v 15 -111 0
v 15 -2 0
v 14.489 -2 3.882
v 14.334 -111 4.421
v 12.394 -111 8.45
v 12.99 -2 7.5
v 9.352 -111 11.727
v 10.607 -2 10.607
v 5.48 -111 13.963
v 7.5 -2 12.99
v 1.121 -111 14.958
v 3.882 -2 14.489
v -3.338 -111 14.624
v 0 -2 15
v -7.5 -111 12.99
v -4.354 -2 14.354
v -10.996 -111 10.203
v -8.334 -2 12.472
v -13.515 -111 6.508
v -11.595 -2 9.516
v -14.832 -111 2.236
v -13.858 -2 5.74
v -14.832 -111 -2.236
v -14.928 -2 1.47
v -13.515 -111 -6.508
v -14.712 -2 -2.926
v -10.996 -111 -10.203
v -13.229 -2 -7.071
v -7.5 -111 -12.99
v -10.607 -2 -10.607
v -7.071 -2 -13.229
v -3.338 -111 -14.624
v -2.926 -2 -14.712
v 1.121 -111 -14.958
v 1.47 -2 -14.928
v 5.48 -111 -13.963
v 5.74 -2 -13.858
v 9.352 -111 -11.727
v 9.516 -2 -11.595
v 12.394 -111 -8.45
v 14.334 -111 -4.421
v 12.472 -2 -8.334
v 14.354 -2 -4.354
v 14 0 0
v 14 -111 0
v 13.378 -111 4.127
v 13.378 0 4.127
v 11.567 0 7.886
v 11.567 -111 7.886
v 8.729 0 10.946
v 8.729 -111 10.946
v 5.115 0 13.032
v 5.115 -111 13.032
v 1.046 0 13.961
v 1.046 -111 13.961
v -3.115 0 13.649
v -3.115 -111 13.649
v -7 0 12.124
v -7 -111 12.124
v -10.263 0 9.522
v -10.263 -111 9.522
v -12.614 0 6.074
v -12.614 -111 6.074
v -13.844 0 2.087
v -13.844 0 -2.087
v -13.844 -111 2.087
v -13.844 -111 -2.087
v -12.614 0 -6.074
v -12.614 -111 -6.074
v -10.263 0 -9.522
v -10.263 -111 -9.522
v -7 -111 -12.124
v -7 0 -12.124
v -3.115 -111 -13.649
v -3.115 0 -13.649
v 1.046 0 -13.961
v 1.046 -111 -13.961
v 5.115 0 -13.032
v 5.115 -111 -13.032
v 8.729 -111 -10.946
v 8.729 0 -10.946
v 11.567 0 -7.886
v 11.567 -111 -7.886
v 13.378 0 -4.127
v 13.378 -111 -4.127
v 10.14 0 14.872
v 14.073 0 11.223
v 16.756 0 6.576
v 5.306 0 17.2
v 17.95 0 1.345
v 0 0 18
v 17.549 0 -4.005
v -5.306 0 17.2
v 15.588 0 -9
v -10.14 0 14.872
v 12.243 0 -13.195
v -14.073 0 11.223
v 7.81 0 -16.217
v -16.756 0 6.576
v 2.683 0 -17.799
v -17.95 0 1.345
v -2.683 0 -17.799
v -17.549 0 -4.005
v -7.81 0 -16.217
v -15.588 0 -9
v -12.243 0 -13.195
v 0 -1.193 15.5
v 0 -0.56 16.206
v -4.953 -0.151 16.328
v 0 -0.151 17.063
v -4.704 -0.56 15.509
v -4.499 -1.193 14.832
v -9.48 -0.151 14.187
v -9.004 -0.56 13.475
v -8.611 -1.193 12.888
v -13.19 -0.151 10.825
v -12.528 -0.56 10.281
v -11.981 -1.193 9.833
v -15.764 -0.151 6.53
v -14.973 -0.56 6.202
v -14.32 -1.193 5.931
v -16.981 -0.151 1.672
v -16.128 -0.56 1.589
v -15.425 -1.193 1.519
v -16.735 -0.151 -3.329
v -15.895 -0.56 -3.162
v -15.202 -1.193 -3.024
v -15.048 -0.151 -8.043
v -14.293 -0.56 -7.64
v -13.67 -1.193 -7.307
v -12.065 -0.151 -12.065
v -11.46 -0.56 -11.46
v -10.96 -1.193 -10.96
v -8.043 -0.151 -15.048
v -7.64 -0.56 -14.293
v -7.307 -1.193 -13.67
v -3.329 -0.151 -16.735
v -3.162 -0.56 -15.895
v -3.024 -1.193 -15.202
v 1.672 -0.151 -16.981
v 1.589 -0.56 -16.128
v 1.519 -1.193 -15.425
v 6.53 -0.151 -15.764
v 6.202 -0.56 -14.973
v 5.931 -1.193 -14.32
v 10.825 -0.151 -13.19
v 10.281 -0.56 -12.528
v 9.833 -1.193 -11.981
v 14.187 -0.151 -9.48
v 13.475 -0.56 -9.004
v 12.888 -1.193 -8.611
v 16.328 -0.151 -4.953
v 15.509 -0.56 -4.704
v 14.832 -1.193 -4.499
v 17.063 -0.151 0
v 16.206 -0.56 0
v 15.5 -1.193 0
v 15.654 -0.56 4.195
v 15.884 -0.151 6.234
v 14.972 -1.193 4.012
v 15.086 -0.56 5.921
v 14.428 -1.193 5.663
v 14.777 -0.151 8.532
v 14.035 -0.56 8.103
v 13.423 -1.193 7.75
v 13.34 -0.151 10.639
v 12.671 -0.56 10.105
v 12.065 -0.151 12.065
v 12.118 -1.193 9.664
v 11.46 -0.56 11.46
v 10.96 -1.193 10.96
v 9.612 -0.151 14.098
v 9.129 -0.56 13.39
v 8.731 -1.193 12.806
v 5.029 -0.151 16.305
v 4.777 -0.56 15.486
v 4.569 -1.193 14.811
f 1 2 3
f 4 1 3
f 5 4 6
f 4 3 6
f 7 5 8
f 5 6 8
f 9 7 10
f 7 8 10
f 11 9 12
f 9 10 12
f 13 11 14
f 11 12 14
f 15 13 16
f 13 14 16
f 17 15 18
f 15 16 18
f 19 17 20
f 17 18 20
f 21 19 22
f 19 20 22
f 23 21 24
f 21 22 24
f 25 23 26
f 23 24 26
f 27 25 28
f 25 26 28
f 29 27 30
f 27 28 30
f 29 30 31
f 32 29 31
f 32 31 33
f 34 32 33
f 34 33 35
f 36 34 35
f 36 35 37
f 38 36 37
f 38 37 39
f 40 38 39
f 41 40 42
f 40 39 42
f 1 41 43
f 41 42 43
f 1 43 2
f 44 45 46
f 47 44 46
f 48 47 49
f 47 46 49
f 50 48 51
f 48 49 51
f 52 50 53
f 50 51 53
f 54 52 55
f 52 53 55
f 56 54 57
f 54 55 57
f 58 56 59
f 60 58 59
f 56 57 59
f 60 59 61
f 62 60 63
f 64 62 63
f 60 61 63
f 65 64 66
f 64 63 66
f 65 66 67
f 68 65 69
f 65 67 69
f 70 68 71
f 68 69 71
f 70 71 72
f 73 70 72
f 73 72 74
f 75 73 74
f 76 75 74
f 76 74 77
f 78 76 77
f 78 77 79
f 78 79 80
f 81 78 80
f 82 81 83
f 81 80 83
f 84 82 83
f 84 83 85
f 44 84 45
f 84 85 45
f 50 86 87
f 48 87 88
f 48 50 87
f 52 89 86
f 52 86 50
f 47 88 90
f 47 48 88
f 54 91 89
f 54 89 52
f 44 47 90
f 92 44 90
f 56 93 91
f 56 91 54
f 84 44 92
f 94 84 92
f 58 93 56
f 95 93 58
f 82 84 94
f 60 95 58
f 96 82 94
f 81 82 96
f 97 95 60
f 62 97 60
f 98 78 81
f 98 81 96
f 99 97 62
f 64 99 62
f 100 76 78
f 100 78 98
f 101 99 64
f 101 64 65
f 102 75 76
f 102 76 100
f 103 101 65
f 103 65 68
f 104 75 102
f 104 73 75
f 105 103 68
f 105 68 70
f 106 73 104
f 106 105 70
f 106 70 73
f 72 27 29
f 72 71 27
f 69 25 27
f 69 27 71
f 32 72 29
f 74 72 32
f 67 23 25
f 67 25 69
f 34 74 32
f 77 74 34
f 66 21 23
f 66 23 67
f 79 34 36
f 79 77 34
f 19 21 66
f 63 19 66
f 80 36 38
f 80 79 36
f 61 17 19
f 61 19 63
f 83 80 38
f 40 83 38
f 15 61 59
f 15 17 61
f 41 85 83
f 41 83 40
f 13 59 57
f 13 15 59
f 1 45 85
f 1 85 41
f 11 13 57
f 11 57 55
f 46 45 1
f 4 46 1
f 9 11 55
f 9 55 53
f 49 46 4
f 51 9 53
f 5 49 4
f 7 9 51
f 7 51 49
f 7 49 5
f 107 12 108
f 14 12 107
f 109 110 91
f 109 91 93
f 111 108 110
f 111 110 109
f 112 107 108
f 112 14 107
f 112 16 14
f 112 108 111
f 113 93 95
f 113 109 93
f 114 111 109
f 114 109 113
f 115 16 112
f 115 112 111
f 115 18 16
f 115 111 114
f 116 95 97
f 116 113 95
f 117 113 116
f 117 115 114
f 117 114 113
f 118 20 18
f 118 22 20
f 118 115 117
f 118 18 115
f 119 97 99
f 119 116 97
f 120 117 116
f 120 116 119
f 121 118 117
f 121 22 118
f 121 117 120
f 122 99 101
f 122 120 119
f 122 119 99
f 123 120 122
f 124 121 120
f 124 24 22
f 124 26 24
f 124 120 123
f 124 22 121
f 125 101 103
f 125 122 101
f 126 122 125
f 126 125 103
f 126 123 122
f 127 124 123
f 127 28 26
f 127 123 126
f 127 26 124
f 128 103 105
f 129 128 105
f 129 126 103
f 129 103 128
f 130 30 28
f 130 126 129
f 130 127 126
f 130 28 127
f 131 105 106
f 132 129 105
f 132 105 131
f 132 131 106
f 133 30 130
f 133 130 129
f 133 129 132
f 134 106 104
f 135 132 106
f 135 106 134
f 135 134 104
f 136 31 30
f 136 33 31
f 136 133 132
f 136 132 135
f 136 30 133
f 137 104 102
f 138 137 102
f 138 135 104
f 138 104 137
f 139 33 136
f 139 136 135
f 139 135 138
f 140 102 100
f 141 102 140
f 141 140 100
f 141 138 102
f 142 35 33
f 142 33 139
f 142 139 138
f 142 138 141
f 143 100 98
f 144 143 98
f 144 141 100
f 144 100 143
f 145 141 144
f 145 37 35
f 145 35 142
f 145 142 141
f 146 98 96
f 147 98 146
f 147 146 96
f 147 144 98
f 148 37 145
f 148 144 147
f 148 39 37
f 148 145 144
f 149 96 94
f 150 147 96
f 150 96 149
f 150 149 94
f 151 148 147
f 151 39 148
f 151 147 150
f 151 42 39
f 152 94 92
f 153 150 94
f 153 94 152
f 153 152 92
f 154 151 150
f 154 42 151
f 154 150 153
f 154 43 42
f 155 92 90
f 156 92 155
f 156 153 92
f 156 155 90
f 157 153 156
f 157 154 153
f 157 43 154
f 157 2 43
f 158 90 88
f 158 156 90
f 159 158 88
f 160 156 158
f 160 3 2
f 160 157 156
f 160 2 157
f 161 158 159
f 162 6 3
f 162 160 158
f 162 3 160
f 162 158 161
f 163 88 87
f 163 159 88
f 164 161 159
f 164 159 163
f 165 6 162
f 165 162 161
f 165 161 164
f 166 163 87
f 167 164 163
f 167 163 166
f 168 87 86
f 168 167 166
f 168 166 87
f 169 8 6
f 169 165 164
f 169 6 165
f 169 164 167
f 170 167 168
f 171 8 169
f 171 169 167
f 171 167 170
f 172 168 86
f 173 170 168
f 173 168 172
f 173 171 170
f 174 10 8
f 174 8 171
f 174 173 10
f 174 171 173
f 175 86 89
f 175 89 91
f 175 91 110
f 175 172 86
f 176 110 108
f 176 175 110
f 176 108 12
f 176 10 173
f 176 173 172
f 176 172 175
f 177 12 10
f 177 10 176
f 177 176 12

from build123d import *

# Parameters (mm, degrees)
F0_R     = 15
F1_DEPTH = 111
F2_R     = 14
F3_DEPTH = 111


with BuildPart() as f1:
    # F0 (on Front) → F1 (new body)
    with BuildSketch(Plane.XZ):
        Circle(F0_R)
    extrude(amount=F1_DEPTH)

    # F2 (on face) → F3 (cut)
    with BuildSketch(Plane.XZ.offset(111)):
        Circle(F2_R)
    extrude(amount=-F3_DEPTH, mode=Mode.SUBTRACT)

    # F4 (on Right) → F5 (revolve)
    with BuildSketch(Plane.YZ):
        with BuildLine():
            Line((-2, 15), (0, 15))
            Line((0, 15), (0, 18))
            ThreePointArc((0, 18), (-0.559736, 16.206491), (-2, 15))
        make_face()
    revolve(axis=Axis((0, -111, 0), (0, -1, 0)))


solid = f1.part
